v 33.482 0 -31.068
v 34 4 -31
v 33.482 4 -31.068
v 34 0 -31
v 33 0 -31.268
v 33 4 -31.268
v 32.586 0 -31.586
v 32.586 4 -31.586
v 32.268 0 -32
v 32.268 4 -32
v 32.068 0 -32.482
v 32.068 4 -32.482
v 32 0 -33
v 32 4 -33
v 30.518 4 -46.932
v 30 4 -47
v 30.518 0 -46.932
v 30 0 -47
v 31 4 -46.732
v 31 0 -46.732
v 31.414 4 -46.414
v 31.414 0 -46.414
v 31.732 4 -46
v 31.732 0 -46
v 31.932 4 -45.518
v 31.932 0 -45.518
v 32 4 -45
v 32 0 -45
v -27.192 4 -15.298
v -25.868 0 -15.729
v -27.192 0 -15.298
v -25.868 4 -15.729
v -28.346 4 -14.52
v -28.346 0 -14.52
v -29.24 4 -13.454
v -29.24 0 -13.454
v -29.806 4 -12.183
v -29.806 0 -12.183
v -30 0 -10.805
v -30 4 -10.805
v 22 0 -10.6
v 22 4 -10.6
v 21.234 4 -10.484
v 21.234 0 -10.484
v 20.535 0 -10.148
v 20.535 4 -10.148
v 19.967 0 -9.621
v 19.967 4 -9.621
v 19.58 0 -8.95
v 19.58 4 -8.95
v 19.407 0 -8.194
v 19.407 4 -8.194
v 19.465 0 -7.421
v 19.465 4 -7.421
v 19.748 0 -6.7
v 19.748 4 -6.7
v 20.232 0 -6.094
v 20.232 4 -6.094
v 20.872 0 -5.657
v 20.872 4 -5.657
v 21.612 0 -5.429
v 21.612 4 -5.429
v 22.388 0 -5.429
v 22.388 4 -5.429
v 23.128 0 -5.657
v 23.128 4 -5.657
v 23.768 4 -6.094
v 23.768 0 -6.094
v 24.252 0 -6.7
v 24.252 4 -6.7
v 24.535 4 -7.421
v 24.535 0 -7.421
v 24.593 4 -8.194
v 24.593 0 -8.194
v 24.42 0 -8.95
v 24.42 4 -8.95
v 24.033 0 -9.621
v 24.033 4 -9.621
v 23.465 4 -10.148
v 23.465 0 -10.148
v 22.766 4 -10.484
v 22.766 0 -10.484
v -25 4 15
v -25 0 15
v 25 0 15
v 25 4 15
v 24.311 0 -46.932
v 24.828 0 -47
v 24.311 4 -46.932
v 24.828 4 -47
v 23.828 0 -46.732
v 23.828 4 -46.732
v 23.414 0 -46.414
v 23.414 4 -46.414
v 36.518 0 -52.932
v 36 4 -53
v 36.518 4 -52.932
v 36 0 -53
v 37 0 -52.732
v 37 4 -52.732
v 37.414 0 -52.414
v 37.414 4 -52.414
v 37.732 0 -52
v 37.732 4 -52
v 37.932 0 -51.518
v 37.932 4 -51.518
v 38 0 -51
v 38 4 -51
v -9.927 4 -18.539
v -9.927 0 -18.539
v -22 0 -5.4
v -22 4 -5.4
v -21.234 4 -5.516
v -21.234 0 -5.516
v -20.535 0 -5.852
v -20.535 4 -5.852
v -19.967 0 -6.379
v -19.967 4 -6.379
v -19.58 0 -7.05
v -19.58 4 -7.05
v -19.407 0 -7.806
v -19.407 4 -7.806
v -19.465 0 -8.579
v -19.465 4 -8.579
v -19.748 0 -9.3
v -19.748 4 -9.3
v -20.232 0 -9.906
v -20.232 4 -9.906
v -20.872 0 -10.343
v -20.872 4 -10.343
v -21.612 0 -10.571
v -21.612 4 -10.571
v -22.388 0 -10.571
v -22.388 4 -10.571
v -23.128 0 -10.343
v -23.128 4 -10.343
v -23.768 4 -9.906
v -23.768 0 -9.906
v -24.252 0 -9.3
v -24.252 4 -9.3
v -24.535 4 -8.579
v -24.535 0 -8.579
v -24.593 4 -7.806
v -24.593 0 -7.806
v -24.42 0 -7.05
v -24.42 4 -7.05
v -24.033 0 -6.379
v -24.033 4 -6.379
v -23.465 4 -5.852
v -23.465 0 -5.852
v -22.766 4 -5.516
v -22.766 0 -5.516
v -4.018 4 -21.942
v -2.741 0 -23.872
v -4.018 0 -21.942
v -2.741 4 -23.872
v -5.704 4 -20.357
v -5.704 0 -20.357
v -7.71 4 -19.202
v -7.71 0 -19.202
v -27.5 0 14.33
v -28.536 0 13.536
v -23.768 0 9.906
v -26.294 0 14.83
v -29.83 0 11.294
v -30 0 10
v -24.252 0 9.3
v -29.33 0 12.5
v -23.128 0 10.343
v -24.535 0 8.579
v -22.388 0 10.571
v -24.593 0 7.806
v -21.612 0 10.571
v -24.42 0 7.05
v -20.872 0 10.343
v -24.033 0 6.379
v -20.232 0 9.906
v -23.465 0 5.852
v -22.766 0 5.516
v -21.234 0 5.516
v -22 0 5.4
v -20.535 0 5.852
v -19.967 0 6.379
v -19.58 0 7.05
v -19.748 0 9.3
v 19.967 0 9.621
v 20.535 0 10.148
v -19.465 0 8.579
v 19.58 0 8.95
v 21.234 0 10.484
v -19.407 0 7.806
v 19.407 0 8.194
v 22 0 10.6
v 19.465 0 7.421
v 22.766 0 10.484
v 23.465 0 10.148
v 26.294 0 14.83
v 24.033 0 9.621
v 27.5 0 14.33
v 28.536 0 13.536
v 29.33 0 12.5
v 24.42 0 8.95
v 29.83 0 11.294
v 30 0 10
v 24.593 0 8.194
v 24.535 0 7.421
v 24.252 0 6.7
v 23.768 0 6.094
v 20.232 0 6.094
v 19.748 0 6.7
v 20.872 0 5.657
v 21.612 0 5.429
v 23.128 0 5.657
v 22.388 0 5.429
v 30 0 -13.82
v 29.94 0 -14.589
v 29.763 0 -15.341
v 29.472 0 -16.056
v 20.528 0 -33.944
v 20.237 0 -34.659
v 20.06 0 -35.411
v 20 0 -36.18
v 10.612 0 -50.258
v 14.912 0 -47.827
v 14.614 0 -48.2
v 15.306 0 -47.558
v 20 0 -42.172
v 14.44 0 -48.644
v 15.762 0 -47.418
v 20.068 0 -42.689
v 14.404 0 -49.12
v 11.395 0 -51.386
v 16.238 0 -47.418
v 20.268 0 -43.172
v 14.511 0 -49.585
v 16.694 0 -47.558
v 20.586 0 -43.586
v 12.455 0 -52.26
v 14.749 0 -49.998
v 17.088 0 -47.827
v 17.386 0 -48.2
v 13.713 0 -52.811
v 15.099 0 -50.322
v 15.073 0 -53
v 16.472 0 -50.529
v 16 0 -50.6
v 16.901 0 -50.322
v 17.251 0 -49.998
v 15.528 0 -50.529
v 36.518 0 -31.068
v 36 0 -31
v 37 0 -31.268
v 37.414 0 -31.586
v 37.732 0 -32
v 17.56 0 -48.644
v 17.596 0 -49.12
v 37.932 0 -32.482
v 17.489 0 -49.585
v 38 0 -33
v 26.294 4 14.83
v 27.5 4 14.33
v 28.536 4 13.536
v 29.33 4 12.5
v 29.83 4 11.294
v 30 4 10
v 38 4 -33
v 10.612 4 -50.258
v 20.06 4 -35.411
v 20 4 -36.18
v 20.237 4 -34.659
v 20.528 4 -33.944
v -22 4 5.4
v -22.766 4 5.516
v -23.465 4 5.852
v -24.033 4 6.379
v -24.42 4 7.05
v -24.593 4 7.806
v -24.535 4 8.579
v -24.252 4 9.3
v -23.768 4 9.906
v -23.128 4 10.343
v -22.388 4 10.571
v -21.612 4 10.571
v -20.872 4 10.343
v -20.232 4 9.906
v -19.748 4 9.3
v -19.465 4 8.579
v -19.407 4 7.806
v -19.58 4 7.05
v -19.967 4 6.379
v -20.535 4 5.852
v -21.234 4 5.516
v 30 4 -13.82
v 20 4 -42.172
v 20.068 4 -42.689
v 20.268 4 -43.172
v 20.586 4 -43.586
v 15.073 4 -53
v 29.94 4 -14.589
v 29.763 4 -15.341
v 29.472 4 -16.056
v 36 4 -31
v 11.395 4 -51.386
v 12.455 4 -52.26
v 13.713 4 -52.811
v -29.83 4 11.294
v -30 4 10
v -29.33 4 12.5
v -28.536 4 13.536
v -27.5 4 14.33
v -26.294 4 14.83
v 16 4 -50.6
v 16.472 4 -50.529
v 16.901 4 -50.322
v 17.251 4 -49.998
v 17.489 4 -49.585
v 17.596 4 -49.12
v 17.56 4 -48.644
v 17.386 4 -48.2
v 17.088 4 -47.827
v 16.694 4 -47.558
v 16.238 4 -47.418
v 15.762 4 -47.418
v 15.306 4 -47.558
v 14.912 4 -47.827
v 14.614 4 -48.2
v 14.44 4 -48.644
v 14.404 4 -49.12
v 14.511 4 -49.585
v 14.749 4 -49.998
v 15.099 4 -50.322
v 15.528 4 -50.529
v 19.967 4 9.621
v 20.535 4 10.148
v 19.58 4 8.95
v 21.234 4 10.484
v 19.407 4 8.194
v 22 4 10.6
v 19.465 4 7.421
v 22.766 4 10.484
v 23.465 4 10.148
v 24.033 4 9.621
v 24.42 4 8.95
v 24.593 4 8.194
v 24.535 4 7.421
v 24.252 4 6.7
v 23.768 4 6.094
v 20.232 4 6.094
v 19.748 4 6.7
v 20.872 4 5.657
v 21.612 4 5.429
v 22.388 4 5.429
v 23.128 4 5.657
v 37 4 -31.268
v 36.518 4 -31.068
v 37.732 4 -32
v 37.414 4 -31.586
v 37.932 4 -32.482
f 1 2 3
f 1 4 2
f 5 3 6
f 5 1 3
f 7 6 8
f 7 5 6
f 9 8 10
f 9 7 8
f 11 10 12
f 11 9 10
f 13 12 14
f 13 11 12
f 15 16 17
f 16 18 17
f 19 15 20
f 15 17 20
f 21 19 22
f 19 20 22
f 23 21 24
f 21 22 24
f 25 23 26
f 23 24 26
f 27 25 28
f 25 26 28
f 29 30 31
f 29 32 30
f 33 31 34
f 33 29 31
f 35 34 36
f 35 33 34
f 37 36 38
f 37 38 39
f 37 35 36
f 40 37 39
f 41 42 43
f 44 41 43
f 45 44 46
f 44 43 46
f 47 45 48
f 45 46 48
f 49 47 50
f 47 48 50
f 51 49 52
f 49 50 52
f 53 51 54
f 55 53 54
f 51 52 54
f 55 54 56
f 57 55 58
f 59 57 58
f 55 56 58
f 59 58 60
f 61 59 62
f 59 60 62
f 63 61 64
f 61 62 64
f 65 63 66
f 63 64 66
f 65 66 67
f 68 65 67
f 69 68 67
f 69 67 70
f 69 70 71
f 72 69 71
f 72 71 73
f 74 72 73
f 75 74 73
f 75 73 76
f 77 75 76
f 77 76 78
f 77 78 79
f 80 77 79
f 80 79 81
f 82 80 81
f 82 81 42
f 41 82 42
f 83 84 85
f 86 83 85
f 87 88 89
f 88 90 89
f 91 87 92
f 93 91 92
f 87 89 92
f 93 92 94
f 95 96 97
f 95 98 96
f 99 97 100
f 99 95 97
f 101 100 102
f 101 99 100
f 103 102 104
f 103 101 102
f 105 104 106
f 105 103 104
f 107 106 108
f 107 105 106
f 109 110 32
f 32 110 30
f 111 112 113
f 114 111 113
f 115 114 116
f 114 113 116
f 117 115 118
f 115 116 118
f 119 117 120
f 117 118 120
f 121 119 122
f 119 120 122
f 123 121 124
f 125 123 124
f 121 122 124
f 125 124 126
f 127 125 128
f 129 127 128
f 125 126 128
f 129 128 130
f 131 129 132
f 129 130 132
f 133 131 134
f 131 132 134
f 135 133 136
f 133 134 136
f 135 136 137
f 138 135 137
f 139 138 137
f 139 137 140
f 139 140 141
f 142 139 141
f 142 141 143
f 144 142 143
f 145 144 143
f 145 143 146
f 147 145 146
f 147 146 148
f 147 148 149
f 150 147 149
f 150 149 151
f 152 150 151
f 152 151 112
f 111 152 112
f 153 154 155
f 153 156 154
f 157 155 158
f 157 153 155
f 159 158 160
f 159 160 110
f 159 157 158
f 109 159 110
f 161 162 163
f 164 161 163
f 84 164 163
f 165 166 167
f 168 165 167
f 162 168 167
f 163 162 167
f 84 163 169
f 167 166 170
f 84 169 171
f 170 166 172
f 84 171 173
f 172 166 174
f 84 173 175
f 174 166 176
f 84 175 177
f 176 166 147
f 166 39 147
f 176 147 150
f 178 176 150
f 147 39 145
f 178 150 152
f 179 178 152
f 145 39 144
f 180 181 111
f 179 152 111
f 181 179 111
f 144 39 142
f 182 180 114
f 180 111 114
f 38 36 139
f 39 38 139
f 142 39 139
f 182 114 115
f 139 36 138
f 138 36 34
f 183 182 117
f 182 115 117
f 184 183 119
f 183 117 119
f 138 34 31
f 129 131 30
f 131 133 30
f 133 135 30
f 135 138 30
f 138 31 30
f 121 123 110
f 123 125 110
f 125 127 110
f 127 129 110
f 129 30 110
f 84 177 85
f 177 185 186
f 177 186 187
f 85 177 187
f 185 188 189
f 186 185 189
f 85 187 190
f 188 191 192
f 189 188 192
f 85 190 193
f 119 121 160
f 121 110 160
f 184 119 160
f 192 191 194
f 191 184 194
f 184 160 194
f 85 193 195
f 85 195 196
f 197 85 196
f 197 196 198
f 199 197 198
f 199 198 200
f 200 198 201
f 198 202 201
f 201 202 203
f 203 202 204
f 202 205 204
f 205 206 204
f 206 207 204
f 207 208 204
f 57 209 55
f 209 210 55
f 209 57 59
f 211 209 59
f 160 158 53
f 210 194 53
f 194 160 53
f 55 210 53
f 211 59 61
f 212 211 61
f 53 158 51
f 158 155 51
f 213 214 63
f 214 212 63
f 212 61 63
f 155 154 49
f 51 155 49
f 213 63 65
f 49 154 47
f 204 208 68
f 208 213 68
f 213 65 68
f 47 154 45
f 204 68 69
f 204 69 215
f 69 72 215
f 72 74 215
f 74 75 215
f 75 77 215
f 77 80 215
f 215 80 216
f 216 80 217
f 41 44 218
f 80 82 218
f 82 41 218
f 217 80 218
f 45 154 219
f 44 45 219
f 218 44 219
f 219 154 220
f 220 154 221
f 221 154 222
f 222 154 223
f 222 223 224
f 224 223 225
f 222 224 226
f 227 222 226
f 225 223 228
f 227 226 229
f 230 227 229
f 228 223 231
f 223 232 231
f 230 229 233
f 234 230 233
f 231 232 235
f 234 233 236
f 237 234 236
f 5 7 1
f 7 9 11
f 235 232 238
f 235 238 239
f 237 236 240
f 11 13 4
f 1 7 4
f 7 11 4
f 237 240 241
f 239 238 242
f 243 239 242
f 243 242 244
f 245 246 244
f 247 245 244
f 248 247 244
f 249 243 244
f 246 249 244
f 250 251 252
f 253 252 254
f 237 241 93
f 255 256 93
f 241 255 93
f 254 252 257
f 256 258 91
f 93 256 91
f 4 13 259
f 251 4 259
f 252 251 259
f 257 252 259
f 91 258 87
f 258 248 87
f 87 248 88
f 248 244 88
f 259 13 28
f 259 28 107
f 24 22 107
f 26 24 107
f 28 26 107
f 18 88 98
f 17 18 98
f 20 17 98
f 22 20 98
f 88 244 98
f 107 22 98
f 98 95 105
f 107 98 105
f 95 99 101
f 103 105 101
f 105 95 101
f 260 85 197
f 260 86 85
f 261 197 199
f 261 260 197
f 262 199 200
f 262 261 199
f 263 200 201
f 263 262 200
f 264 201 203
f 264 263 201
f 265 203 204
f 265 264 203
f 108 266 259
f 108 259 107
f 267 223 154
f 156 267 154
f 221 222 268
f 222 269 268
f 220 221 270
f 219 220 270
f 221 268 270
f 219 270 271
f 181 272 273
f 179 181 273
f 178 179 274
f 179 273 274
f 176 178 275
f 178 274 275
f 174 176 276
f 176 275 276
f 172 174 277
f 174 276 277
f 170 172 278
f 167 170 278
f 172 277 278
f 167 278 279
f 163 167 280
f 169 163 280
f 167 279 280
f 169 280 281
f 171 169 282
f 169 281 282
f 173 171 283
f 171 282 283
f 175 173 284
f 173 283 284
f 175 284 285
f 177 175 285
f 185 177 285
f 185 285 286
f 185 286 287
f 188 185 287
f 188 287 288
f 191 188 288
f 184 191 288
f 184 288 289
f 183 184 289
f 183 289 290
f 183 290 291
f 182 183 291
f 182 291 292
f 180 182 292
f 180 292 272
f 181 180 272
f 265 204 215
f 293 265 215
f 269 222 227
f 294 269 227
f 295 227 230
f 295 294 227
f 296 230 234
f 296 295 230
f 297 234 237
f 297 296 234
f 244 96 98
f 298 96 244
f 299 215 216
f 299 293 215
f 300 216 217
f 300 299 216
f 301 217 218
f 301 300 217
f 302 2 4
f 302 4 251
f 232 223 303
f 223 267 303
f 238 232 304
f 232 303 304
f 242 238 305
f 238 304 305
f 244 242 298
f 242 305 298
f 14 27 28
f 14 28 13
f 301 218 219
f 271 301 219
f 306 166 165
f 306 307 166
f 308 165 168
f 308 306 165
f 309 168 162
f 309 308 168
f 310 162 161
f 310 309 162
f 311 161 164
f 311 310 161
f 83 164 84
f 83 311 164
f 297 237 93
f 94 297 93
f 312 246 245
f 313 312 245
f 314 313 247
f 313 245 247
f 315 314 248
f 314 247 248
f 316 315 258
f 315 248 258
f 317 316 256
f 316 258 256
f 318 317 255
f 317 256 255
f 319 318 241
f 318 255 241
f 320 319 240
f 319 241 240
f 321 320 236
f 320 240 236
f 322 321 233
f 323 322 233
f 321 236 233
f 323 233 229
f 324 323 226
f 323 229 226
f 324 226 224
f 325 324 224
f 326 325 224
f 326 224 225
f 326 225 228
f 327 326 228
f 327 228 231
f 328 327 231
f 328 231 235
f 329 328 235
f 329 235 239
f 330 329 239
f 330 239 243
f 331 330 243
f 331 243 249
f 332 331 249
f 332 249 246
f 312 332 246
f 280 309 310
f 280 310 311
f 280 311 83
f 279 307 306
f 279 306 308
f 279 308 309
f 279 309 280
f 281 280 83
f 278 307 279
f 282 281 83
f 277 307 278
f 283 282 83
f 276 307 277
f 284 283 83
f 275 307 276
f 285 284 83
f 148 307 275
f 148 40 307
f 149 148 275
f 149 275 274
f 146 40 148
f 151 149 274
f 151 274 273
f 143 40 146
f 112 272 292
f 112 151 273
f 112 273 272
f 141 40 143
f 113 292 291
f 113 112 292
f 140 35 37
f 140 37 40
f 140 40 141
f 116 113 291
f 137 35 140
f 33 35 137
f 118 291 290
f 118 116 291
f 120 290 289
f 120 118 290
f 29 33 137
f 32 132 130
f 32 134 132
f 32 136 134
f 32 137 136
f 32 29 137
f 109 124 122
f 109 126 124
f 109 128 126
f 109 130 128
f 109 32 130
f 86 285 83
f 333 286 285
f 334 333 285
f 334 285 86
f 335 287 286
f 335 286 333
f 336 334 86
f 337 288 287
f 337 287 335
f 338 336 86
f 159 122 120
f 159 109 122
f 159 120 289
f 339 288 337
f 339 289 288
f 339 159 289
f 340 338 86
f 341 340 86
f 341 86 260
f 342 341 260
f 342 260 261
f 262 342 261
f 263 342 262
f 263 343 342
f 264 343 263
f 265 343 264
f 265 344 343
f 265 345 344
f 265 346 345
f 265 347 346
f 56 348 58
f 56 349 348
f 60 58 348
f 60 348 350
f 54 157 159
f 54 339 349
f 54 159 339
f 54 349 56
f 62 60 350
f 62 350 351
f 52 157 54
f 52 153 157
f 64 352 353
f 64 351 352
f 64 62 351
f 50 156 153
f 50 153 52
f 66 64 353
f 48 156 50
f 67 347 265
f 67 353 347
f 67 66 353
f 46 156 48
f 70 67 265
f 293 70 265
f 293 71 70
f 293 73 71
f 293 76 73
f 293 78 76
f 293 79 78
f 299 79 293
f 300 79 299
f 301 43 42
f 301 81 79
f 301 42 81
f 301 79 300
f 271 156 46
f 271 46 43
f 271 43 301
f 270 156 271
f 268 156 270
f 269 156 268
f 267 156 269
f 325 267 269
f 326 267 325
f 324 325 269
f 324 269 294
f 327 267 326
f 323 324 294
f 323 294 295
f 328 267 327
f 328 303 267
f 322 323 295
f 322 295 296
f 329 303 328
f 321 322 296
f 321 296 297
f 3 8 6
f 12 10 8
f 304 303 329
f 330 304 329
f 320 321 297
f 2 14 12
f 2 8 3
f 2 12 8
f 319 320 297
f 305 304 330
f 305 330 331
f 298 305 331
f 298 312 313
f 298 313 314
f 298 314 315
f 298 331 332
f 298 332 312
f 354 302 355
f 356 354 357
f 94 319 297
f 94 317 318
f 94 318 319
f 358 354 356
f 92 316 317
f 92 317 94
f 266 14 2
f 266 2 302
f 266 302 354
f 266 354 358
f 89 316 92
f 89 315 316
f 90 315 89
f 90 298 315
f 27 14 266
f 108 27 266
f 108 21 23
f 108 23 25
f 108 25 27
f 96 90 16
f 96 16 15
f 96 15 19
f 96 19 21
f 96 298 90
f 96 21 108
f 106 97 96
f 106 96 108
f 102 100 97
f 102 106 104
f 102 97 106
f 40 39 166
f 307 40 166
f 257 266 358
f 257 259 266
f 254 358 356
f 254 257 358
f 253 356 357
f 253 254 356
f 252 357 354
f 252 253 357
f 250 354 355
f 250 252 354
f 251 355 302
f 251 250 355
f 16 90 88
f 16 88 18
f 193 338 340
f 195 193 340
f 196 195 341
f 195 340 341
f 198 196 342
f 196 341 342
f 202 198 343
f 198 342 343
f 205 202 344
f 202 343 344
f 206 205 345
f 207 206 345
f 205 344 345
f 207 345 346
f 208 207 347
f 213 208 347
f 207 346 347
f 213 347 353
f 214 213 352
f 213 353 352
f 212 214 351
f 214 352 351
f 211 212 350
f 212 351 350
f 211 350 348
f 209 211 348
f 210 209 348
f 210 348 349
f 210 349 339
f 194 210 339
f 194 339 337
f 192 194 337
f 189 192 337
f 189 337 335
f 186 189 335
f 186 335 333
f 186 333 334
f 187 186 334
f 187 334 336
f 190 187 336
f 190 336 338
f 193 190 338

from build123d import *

# Parameters (mm, degrees)
EXTRUDE_1_DEPTH     = 4
FILLET_1_R          = 10
FILLET_2_R          = 5
SKETCH_2_R          = 2.6
CUT_EXTRUDE_1_DEPTH = 62.032778079
SKETCH_3_R          = 1.6
CUT_EXTRUDE_2_DEPTH = 62.032778079
EXTRUDE_2_DEPTH     = 4
FILLET_3_R          = 2


with BuildPart() as part:
    # 草图1 → 凸台-拉伸1 (new body)
    with BuildSketch(Plane(origin=(0, 0, 0), x_dir=(1, 0, 0), z_dir=(0, 1, 0))):
        Polygon((-30, -15), (30, -15), (30, 15), (20, 35), (20, 43), (24, 47), (24, 53), (12, 53), (-5, 19.408174518), (-30, 15), align=None)
    extrude(amount=EXTRUDE_1_DEPTH)

    # 圆角1
    fillet_1_edges = [part.edges().sort_by_distance(p)[0] for p in [
        (-5, 2, -19.408174518),
    ]]
    fillet(fillet_1_edges, radius=FILLET_1_R)

    # 圆角2
    fillet_2_edges = [part.edges().sort_by_distance(p)[0] for p in [
        (30, 2, -15),
        (30, 2, 15),
        (-30, 2, 15),
        (-30, 2, -15),
        (12, 2, -53),
        (20, 2, -35),
    ]]
    fillet(fillet_2_edges, radius=FILLET_2_R)

    # 草图2 → 切除-拉伸1 (cut, through all)
    with BuildSketch(Plane(origin=(0, 4, 0), x_dir=(1, 0, 0), z_dir=(0, 1, 0))):
        with Locations(Location((-22, 8, 0), (0, 0, 270))):
            Circle(SKETCH_2_R)
        with Locations(Location((22, 8, 0), (0, 0, 90))):
            Circle(SKETCH_2_R)
        with Locations(Location((22, -8, 0), (0, 0, 270))):
            Circle(SKETCH_2_R)
        with Locations(Location((-22, -8, 0), (0, 0, 90))):
            Circle(SKETCH_2_R)
    extrude(amount=-CUT_EXTRUDE_1_DEPTH, mode=Mode.SUBTRACT)

    # 草图3 → 切除-拉伸2 (cut, through all)
    with BuildSketch(Plane.XZ):
        with Locations(Location((16, -49, 0), (0, 0, 270))):
            Circle(SKETCH_3_R)
    extrude(amount=-CUT_EXTRUDE_2_DEPTH, mode=Mode.SUBTRACT)

    # 草图4 → 凸台-拉伸2 (add)
    with BuildSketch(Plane(origin=(0, 4, 0), x_dir=(1, 0, 0), z_dir=(0, 1, 0))):
        Polygon((24, 47), (32, 47), (32, 31), (38, 31), (38, 53), (24, 53), align=None)
    extrude(amount=-EXTRUDE_2_DEPTH)

    # 圆角3
    fillet_3_edges = [part.edges().sort_by_distance(p)[0] for p in [
        (38, 2, -53),
        (38, 2, -31),
        (32, 2, -31),
        (32, 2, -47),
        (24, 2, -47),
        (20, 2, -43),
    ]]
    fillet(fillet_3_edges, radius=FILLET_3_R)


solid = part.part
